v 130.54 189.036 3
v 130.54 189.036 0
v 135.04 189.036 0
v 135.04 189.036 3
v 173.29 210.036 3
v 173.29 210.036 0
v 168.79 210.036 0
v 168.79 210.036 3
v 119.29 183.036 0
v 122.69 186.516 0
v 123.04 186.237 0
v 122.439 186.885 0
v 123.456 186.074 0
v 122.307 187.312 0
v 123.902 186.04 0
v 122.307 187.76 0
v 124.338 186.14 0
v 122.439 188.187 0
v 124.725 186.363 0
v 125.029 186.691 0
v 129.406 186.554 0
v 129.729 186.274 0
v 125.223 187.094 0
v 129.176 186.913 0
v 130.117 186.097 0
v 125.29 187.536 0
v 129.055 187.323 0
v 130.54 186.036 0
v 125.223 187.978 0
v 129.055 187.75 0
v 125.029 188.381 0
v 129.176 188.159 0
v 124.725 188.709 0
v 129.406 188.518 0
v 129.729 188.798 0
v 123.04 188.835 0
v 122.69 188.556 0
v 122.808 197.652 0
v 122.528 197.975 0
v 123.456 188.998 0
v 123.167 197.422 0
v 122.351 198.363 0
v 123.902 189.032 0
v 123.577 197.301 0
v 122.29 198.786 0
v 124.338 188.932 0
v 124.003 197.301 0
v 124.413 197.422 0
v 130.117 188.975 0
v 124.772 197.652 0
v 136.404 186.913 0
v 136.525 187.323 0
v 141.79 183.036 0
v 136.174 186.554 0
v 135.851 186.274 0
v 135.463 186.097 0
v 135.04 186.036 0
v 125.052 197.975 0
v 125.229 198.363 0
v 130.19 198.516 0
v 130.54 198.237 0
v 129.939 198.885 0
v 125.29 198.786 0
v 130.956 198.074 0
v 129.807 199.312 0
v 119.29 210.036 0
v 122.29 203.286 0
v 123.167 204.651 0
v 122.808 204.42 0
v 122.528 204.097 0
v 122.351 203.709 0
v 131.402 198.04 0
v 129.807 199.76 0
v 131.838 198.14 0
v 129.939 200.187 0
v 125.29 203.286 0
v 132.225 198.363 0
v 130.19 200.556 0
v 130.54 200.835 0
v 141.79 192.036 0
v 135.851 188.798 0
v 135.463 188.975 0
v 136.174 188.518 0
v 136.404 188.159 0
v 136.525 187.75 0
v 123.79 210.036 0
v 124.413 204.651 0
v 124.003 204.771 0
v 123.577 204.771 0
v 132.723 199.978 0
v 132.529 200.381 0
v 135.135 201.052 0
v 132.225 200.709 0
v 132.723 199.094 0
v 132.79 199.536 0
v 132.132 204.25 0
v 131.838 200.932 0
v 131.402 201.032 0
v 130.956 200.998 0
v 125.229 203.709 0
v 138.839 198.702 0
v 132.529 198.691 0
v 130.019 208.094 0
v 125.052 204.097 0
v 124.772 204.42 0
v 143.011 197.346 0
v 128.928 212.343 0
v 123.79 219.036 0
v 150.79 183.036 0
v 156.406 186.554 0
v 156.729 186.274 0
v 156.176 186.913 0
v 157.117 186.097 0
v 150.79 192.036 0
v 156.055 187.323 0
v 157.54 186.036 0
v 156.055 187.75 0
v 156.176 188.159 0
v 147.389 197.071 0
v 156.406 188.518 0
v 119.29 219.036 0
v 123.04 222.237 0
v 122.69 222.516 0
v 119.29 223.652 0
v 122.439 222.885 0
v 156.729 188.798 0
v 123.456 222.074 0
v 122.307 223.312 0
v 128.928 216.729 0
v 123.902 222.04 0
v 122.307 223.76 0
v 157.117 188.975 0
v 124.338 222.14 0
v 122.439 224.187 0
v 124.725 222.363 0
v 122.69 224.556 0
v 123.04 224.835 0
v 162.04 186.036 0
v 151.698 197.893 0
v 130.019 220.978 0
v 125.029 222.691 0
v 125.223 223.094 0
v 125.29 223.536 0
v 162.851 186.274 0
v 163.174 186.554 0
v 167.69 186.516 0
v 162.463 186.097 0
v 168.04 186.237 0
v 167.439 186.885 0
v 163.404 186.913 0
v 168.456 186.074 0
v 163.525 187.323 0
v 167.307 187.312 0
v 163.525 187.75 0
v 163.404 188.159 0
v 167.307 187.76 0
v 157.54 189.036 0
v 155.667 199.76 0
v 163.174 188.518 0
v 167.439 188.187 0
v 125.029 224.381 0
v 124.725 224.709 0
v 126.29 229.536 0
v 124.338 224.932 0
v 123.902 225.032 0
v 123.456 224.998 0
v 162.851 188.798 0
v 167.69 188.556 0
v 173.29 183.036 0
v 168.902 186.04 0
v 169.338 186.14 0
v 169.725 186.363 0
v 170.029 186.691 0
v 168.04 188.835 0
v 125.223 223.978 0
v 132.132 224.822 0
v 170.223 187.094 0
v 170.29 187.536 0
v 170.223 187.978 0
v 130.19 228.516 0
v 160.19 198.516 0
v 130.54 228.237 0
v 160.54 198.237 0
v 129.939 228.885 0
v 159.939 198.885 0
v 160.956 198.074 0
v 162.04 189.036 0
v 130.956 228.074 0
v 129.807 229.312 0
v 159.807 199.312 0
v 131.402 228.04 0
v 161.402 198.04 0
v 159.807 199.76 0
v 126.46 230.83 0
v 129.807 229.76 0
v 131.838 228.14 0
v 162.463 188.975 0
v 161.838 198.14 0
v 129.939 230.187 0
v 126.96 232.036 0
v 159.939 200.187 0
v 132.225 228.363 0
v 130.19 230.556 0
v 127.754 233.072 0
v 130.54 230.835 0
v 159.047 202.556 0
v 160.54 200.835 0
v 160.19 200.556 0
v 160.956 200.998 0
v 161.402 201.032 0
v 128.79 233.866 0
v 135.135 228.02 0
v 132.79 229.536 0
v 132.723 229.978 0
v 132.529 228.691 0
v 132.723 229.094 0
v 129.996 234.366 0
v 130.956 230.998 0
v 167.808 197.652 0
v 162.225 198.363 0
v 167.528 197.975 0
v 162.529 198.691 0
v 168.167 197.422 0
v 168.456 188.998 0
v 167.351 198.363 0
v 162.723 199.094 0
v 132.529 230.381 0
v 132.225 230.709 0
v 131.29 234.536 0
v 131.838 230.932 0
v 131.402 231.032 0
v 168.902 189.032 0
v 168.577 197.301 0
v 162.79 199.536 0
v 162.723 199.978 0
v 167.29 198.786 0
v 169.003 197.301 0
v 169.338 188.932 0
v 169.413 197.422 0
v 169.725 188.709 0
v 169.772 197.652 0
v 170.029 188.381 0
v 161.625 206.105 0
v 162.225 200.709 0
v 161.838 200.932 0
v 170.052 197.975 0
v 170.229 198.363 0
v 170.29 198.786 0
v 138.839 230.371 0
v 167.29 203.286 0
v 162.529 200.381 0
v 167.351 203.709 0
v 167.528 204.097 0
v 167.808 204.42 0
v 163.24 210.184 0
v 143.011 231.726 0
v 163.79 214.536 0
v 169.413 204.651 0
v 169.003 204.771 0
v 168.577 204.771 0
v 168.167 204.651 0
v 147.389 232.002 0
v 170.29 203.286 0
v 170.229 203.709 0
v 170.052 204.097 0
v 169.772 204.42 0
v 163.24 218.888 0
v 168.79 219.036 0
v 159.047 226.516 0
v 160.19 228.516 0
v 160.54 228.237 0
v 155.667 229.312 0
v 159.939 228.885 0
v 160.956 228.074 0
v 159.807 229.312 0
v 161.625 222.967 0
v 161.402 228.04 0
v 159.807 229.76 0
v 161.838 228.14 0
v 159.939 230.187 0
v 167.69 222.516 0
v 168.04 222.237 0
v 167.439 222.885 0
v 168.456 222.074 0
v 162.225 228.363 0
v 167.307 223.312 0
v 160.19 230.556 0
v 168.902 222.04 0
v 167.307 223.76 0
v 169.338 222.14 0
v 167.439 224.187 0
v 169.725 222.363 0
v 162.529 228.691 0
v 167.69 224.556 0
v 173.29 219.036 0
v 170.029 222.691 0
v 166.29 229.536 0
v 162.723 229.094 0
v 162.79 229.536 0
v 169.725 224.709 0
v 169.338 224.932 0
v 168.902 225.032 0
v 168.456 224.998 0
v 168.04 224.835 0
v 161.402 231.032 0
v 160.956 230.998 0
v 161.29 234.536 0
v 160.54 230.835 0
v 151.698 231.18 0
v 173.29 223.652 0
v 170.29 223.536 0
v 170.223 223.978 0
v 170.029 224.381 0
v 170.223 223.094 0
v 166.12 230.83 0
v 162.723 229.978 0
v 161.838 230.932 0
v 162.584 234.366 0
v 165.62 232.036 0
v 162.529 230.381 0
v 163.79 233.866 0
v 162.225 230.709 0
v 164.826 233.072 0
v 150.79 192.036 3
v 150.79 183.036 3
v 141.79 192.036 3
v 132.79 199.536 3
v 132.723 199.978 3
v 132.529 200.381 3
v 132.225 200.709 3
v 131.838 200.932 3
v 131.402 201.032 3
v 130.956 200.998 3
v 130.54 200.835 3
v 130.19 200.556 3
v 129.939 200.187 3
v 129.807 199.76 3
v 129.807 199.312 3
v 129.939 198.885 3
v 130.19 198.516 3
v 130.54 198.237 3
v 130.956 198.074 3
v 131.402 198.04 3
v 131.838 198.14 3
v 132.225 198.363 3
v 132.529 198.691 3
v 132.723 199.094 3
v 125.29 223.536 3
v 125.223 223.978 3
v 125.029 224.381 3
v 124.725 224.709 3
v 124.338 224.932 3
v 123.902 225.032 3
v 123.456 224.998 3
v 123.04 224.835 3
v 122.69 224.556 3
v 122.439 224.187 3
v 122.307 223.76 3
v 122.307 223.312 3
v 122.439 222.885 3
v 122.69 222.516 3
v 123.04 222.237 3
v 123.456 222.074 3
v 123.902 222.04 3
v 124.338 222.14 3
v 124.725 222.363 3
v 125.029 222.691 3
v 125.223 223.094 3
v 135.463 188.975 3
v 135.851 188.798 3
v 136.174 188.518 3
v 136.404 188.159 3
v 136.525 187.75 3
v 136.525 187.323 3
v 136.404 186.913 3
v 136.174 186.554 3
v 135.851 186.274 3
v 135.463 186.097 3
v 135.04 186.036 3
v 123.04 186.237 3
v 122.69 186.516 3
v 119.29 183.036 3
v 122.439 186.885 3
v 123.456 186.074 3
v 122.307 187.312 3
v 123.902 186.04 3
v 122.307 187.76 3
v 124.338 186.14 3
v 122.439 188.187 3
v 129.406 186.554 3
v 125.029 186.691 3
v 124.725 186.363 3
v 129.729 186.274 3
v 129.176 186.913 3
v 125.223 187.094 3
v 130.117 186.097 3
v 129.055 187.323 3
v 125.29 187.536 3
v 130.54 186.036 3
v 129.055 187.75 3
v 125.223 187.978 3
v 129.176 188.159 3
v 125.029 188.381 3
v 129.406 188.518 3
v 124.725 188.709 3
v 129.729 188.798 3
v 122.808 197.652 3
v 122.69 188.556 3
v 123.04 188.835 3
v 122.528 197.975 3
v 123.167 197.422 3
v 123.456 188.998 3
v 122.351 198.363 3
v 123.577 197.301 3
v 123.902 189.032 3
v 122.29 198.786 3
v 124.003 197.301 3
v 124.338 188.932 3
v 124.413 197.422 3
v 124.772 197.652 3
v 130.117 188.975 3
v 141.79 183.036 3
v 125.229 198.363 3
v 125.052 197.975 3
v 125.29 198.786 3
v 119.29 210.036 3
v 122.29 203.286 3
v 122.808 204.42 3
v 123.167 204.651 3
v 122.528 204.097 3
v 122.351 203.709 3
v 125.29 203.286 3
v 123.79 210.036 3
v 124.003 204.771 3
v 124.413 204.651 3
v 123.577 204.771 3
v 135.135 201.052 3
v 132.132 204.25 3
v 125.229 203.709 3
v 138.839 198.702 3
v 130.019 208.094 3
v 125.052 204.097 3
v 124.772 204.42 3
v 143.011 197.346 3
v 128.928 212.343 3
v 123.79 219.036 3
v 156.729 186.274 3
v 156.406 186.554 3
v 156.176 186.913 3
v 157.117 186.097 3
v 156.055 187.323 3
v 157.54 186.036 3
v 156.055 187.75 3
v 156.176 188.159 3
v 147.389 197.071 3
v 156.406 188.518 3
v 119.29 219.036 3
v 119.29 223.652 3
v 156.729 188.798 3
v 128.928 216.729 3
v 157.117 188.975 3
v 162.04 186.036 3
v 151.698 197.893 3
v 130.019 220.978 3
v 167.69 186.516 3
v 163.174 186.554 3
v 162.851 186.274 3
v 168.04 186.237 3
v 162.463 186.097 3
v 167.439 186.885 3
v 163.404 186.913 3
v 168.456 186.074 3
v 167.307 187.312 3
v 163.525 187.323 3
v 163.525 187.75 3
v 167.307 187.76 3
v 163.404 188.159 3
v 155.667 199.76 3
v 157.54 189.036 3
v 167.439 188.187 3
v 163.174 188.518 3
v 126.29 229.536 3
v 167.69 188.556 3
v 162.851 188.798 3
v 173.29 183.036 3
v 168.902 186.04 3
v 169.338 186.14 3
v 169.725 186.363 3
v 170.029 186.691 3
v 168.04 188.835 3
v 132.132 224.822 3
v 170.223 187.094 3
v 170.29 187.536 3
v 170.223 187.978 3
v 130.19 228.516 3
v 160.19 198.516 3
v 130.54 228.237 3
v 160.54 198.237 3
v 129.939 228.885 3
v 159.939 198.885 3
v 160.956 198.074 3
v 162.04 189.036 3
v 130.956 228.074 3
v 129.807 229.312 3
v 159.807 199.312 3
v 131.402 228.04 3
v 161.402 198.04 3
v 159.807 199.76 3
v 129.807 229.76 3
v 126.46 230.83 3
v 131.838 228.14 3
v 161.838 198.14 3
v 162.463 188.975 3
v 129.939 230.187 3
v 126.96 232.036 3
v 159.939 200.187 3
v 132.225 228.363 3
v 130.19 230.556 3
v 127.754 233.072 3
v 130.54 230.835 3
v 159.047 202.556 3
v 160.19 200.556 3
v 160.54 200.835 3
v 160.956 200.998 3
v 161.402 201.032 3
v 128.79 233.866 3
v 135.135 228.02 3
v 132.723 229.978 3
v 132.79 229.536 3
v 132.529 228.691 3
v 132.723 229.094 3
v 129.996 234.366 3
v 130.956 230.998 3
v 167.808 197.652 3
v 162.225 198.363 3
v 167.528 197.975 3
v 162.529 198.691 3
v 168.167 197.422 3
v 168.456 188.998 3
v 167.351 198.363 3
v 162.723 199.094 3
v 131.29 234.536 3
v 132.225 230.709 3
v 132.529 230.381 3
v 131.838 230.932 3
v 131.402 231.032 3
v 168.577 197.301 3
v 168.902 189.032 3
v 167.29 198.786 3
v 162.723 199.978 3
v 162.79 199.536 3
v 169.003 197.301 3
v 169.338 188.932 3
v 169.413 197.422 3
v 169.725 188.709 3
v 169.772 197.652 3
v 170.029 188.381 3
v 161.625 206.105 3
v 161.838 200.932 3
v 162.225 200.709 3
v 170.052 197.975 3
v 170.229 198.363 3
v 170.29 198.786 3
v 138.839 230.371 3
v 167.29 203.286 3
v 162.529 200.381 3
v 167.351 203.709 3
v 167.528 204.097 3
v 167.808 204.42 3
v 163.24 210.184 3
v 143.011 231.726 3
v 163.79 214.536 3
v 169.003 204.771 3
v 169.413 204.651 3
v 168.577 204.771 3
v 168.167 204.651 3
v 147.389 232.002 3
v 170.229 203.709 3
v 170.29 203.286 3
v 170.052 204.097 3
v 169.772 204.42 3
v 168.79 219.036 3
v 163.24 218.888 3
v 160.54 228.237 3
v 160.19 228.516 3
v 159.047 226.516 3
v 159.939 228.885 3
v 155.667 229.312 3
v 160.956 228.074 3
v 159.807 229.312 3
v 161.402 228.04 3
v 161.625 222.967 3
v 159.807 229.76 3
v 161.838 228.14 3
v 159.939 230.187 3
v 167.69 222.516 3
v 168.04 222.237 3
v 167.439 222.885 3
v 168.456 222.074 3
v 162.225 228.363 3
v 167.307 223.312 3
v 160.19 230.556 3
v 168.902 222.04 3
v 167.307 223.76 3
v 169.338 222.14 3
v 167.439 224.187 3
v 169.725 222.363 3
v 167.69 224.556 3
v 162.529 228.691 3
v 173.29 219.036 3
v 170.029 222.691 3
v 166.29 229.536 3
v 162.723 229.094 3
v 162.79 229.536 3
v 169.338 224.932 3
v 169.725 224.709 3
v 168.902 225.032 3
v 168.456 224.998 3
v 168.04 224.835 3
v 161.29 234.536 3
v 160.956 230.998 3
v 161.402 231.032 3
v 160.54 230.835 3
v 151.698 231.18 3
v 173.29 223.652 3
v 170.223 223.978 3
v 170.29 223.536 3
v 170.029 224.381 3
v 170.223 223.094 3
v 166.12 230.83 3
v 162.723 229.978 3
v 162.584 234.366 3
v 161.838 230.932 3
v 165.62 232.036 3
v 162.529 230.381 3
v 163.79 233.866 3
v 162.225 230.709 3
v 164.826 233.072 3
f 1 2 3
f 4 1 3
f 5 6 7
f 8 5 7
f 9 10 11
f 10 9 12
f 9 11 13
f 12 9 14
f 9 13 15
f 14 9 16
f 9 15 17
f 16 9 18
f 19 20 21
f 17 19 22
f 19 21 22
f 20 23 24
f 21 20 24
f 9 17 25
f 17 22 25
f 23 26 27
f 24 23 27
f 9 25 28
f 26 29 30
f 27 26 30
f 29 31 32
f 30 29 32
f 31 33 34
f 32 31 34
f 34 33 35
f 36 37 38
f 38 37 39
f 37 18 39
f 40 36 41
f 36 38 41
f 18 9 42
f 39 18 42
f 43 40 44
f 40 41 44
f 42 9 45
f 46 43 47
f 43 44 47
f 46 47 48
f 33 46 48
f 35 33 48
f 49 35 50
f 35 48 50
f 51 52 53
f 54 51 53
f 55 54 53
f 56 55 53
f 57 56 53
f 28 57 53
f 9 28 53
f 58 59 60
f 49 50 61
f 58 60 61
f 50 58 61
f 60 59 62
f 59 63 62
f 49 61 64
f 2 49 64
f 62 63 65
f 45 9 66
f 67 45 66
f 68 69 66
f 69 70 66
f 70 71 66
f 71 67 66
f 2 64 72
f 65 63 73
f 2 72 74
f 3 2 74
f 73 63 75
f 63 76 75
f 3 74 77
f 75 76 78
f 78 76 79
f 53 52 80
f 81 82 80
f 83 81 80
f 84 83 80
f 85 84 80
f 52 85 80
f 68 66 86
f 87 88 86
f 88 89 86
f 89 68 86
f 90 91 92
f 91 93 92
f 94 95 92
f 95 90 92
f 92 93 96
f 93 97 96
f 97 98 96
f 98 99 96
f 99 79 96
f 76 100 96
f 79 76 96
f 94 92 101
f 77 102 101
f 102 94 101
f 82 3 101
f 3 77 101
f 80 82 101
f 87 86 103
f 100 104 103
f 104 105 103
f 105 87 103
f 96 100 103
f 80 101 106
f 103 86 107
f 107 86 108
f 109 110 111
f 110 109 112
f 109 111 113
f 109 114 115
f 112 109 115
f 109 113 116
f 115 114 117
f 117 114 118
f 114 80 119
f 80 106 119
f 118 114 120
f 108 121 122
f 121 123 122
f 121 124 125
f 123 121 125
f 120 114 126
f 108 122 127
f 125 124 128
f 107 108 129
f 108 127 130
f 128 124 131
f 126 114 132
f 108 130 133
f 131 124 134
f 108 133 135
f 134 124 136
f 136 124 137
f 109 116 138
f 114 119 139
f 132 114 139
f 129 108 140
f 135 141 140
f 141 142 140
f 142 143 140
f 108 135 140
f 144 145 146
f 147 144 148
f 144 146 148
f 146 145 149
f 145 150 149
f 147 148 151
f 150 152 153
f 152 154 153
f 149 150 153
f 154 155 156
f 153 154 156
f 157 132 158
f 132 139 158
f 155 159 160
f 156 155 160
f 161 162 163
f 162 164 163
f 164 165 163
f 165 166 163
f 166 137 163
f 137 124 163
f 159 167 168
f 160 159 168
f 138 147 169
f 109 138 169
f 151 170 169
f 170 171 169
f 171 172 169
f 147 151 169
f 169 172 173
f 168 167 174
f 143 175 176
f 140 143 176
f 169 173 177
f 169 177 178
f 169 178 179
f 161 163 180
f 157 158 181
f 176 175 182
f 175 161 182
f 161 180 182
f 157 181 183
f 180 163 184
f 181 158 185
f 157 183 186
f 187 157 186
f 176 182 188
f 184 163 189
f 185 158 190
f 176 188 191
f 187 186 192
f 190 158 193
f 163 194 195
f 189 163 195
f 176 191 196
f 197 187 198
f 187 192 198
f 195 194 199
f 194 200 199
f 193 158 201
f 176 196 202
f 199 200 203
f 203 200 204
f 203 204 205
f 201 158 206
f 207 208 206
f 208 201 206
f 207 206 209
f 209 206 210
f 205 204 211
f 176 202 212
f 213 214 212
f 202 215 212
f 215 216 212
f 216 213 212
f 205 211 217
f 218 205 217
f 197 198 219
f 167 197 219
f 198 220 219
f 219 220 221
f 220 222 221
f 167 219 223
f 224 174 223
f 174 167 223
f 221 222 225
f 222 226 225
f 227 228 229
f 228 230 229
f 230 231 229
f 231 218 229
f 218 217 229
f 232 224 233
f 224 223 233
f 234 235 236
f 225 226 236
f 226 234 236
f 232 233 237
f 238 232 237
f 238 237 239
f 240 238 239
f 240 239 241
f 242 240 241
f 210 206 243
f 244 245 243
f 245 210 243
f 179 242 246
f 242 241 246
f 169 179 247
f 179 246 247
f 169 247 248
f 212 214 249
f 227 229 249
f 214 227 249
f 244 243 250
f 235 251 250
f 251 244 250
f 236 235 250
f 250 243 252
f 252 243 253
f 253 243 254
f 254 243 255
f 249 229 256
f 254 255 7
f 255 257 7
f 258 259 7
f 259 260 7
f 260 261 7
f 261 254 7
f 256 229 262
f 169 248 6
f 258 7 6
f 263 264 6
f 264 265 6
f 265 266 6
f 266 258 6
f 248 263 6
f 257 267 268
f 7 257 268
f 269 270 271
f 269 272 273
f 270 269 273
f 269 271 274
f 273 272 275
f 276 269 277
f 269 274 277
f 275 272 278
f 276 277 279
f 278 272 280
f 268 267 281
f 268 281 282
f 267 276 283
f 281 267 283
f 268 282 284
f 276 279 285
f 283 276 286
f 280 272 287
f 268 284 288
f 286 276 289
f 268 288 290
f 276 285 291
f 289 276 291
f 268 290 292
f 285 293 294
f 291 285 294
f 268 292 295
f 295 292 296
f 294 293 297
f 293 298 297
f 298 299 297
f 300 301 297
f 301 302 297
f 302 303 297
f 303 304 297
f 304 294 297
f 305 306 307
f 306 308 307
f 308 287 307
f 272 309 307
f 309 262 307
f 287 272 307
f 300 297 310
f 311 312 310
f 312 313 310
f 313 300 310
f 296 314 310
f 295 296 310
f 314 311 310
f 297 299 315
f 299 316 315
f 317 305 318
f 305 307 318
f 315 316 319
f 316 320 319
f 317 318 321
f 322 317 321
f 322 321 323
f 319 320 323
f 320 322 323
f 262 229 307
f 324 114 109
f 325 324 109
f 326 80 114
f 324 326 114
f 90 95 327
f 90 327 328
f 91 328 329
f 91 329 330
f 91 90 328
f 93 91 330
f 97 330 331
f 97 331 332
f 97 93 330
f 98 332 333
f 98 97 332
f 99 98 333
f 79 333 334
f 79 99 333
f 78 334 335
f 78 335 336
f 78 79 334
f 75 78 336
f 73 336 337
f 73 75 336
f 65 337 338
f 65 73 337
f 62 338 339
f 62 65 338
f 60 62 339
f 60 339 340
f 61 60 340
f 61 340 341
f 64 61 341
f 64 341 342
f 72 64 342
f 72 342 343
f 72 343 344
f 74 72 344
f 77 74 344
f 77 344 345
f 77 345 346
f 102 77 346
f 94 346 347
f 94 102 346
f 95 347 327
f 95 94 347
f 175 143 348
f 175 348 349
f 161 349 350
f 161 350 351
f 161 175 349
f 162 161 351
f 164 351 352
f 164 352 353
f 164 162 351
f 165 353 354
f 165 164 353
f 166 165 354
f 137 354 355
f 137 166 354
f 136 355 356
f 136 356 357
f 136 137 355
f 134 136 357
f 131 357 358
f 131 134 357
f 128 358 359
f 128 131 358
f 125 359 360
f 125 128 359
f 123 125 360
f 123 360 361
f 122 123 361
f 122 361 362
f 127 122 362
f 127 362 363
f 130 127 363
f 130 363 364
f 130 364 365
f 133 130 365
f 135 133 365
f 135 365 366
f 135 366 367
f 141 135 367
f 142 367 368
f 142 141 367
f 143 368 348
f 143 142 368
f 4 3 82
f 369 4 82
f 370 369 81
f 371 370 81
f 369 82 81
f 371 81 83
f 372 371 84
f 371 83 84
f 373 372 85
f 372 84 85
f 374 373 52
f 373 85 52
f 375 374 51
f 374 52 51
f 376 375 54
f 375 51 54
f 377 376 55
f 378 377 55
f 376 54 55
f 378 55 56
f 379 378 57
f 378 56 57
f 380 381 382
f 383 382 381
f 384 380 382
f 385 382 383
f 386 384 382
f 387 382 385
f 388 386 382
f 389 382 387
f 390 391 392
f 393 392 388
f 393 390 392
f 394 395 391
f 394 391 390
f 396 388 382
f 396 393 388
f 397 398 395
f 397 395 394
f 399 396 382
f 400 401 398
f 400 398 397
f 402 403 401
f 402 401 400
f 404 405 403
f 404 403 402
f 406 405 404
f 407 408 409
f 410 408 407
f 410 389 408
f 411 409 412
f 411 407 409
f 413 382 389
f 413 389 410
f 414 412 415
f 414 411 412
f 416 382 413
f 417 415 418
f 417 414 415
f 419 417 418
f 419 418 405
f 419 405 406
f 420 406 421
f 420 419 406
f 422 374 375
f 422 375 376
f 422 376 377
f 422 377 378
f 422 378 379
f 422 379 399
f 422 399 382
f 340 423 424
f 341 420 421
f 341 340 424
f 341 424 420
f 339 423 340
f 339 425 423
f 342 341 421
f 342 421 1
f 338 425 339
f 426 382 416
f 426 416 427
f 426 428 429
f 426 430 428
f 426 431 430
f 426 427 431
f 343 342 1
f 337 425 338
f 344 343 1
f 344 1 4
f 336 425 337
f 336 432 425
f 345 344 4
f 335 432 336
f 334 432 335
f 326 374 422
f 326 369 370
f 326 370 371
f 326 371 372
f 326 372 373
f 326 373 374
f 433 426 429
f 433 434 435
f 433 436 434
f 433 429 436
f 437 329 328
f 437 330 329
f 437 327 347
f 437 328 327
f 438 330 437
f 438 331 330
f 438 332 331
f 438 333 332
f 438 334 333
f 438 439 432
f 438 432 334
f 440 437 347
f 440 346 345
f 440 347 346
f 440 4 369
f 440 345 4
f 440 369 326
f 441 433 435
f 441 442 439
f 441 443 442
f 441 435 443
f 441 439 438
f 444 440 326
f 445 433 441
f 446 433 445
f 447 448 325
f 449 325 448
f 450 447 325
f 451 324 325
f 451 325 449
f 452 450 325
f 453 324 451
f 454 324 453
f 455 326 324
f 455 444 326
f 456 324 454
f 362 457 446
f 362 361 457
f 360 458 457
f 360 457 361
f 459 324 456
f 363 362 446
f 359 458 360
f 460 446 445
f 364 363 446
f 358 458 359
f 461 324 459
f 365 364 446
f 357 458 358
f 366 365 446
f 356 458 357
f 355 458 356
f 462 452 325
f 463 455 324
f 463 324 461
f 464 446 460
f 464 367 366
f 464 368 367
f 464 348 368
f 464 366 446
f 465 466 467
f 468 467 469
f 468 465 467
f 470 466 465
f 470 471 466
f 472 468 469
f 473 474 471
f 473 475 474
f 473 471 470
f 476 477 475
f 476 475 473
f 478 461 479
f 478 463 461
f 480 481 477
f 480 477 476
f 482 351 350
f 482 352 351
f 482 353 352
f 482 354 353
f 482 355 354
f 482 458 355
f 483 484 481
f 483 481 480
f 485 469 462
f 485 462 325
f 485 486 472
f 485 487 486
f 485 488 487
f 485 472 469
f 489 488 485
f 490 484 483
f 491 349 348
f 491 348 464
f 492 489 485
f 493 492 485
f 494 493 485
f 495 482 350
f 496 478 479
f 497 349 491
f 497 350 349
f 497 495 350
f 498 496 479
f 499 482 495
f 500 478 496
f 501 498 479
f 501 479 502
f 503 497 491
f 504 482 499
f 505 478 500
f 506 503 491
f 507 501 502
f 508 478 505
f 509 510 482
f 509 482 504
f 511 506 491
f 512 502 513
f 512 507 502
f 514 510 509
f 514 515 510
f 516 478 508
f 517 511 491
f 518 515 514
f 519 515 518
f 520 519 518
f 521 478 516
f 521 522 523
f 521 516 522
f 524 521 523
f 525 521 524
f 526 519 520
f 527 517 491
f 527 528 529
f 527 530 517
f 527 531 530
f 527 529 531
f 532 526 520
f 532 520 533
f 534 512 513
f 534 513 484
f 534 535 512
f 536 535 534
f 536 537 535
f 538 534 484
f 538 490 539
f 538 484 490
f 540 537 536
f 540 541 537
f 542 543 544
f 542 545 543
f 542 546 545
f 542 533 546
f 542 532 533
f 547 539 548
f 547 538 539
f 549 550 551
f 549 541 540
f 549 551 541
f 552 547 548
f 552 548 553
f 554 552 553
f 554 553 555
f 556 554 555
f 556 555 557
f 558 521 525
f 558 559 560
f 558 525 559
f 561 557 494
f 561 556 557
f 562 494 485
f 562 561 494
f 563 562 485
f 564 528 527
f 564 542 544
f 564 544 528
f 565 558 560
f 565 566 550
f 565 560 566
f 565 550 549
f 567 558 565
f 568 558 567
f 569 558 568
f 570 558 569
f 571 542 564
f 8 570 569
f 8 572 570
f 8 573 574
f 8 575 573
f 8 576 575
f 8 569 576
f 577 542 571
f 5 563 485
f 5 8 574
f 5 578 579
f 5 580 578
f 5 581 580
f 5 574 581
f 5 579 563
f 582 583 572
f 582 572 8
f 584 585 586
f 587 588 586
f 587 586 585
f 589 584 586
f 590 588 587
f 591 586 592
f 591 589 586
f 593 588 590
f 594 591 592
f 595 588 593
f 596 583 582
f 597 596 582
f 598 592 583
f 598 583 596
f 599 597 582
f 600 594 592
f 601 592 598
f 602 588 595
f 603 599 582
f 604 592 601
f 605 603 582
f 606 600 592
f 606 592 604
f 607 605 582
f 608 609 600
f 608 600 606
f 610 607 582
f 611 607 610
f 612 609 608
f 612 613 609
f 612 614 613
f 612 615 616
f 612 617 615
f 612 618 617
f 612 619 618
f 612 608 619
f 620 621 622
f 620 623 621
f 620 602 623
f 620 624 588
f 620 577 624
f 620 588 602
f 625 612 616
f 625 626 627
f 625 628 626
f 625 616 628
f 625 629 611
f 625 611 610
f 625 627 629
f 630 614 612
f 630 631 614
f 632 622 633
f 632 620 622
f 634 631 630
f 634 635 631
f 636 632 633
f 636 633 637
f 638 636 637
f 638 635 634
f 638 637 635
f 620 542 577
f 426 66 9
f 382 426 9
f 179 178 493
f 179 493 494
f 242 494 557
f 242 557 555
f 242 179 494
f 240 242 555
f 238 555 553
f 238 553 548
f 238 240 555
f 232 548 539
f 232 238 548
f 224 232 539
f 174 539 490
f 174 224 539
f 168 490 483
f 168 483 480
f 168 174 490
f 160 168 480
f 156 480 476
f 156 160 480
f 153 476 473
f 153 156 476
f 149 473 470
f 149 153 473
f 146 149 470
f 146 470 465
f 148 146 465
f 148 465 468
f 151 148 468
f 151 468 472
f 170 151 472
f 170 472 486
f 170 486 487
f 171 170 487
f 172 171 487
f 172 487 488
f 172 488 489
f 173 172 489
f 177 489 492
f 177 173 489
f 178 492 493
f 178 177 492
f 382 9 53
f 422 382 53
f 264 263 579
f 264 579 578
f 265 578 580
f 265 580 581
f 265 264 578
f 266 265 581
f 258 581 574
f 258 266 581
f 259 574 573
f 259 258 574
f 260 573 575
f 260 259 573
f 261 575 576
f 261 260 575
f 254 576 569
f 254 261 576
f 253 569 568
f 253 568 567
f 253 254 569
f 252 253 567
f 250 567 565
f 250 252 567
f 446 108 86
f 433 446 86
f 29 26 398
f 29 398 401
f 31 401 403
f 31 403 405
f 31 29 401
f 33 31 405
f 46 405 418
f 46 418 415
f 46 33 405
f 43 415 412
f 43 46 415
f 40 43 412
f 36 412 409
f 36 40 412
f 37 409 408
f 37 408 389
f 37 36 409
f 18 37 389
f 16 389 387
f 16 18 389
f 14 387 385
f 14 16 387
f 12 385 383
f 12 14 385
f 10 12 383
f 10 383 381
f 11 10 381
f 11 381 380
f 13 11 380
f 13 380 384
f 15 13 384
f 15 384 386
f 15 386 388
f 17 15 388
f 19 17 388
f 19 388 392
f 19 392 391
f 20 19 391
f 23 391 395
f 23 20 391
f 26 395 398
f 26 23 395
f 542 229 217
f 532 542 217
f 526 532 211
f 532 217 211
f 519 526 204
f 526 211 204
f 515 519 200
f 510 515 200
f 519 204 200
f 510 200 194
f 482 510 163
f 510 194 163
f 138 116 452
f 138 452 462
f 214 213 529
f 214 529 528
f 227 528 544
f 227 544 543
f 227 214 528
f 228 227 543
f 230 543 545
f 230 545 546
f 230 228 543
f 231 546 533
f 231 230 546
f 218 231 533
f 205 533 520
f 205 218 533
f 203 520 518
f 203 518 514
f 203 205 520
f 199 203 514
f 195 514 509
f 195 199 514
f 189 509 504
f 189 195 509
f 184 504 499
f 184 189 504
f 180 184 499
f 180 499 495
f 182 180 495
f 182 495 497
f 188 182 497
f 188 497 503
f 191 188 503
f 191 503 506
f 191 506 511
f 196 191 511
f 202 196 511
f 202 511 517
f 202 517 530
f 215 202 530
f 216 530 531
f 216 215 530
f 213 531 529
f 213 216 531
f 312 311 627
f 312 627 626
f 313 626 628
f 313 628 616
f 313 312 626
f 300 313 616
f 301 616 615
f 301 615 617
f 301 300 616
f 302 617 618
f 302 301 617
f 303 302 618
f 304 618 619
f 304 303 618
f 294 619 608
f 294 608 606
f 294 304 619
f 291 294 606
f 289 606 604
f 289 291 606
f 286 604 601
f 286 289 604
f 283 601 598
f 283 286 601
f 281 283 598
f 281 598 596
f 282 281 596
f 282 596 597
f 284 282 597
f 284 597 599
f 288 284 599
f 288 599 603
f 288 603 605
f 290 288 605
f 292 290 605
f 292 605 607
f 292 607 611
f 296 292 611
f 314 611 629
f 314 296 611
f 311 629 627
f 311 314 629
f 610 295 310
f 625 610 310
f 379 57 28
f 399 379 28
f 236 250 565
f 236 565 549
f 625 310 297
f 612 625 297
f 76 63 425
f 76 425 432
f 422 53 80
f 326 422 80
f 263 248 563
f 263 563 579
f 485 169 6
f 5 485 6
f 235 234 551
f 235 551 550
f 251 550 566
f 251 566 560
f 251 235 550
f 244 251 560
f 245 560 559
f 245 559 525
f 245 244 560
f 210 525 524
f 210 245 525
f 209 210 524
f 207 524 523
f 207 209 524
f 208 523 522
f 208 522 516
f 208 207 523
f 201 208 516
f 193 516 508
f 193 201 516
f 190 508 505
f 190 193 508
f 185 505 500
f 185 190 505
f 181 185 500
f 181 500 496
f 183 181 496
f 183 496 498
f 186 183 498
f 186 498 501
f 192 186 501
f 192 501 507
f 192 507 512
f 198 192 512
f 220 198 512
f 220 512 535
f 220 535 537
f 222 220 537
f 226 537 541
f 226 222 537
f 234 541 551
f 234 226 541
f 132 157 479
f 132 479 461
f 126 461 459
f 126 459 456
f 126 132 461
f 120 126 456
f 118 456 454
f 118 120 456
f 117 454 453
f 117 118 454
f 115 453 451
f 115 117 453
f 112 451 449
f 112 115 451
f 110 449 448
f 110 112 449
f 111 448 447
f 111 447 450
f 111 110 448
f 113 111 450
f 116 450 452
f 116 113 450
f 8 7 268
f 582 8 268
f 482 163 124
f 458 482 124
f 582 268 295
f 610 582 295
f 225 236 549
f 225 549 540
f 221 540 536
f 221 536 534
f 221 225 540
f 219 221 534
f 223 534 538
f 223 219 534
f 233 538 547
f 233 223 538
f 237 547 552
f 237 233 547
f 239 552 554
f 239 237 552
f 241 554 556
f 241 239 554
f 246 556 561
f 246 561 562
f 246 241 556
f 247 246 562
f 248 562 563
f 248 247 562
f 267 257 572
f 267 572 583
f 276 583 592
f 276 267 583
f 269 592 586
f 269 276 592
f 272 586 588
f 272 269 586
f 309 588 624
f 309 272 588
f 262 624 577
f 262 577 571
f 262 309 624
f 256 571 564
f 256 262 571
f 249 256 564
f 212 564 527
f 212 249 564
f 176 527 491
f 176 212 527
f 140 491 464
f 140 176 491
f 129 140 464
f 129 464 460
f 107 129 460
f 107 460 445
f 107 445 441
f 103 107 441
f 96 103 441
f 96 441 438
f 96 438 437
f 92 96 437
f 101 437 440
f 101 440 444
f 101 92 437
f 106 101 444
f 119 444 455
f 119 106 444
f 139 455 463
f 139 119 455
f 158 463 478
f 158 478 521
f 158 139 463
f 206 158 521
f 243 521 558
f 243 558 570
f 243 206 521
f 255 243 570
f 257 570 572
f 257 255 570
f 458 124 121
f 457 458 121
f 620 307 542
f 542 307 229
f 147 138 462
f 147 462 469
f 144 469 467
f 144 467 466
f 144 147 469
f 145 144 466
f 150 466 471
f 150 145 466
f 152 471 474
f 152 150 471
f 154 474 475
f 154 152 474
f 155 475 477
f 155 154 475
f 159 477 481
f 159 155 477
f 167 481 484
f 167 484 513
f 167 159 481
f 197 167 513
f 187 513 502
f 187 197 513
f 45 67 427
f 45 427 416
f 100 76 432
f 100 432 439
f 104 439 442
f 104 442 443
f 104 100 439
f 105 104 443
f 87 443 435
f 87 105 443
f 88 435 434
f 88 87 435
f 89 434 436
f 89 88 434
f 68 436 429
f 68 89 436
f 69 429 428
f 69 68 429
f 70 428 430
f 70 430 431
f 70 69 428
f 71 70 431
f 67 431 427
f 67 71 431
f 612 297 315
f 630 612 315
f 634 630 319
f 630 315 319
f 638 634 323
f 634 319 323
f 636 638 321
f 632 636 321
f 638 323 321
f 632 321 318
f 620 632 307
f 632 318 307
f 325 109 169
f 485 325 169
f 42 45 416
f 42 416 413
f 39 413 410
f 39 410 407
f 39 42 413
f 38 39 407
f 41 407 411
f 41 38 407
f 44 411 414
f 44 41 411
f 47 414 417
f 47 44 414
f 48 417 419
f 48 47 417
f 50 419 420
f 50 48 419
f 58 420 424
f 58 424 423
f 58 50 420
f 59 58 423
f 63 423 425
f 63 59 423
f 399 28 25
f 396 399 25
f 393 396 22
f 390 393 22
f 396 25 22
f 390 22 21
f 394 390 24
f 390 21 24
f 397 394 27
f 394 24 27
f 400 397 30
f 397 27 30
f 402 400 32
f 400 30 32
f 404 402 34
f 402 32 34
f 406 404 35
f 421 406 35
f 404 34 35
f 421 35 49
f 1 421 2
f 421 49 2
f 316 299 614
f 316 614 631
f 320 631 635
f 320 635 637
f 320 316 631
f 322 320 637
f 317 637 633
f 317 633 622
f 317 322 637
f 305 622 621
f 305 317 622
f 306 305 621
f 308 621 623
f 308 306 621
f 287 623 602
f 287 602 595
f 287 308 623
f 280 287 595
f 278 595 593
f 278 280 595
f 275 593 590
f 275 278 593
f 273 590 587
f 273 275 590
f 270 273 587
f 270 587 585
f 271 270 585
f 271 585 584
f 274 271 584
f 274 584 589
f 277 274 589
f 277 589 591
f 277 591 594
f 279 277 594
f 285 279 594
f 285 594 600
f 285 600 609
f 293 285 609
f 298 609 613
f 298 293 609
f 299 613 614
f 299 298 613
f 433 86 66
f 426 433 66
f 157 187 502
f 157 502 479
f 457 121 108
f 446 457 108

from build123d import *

# Parameters (mm, degrees)
MODEL_R                 = 17.5
MODEL_R_2               = 1.5
SALIENTE_EXTRUIR1_DEPTH = 3


with BuildPart() as part:
    # Model → Saliente-Extruir1 (new body)
    with BuildSketch(Plane.XY):
        with BuildLine():
            Line((119.290027295, 223.651688958), (119.290027295, 219.036053988))
            Line((119.290027295, 219.036053988), (123.790027295, 219.036053988))
            Line((123.790027295, 219.036053988), (123.790027295, 210.036053988))
            Line((123.790027295, 210.036053988), (119.290027295, 210.036053988))
            Line((119.290027295, 210.036053988), (119.290027295, 183.036053988))
            Line((119.290027295, 183.036053988), (141.790027295, 183.036053988))
            Line((141.790027295, 183.036053988), (141.790027295, 192.036053988))
            Line((141.790027295, 192.036053988), (150.790027295, 192.036053988))
            Line((150.790027295, 192.036053988), (150.790027295, 183.036053988))
            Line((150.790027295, 183.036053988), (173.290027295, 183.036053988))
            Line((173.290027295, 183.036053988), (173.290027295, 210.036053988))
            Line((173.290027295, 210.036053988), (168.790027295, 210.036053988))
            Line((168.790027295, 210.036053988), (168.790027295, 219.036053988))
            Line((168.790027295, 219.036053988), (173.290027295, 219.036053988))
            Line((173.290027295, 219.036053988), (173.290027295, 223.651688958))
            Line((173.290027295, 223.651688958), (166.290027295, 229.536053988))
            ThreePointArc((166.290027295, 229.536053988), (164.825561201, 233.071587894), (161.290027295, 234.536053988))
            Line((161.290027295, 234.536053988), (131.290027295, 234.536053988))
            ThreePointArc((131.290027295, 234.536053988), (127.754493389, 233.071587894), (126.290027295, 229.536053988))
            Line((126.290027295, 229.536053988), (119.290027295, 223.651688958))
        make_face()
        with Locations((146.290027295, 214.536053988)):
            Circle(MODEL_R, mode=Mode.SUBTRACT)
        with Locations((168.790027295, 223.536053988)):
            Circle(MODEL_R_2, mode=Mode.SUBTRACT)
        with Locations((161.290027295, 229.536053988)):
            Circle(MODEL_R_2, mode=Mode.SUBTRACT)
        with Locations((168.790027295, 187.536053988)):
            Circle(MODEL_R_2, mode=Mode.SUBTRACT)
        with Locations((161.290027295, 199.536053988)):
            Circle(MODEL_R_2, mode=Mode.SUBTRACT)
        with Locations((123.790027295, 223.536053988)):
            Circle(MODEL_R_2, mode=Mode.SUBTRACT)
        with Locations((131.290027295, 229.536053988)):
            Circle(MODEL_R_2, mode=Mode.SUBTRACT)
        with Locations((131.290027295, 199.536053988)):
            Circle(MODEL_R_2, mode=Mode.SUBTRACT)
        with Locations((123.790027295, 187.536053988)):
            Circle(MODEL_R_2, mode=Mode.SUBTRACT)
        with BuildLine():
            Line((122.290027295, 203.286053988), (122.290027295, 198.786053988))
            ThreePointArc((122.290027295, 198.786053988), (123.790027295, 197.286053988), (125.290027295, 198.786053988))
            Line((125.290027295, 198.786053988), (125.290027295, 203.286053988))
            ThreePointArc((125.290027295, 203.286053988), (123.790027295, 204.786053988), (122.290027295, 203.286053988))
        make_face(mode=Mode.SUBTRACT)
        with BuildLine():
            Line((167.290027295, 203.286053988), (167.290027295, 198.786053988))
            ThreePointArc((167.290027295, 198.786053988), (168.790027295, 197.286053988), (170.290027295, 198.786053988))
            Line((170.290027295, 198.786053988), (170.290027295, 203.286053988))
            ThreePointArc((170.290027295, 203.286053988), (168.790027295, 204.786053988), (167.290027295, 203.286053988))
        make_face(mode=Mode.SUBTRACT)
        with BuildLine():
            Line((162.040027295, 189.036053988), (157.540027295, 189.036053988))
            ThreePointArc((157.540027295, 189.036053988), (156.040027295, 187.536053988), (157.540027295, 186.036053988))
            Line((157.540027295, 186.036053988), (162.040027295, 186.036053988))
            ThreePointArc((162.040027295, 186.036053988), (163.540027295, 187.536053988), (162.040027295, 189.036053988))
        make_face(mode=Mode.SUBTRACT)
        with BuildLine():
            Line((135.040027295, 186.036053988), (130.540027295, 186.036053988))
            ThreePointArc((130.540027295, 186.036053988), (129.040027295, 187.536053988), (130.540027295, 189.036053988))
            Line((130.540027295, 189.036053988), (135.040027295, 189.036053988))
            ThreePointArc((135.040027295, 189.036053988), (136.540027295, 187.536053988), (135.040027295, 186.036053988))
        make_face(mode=Mode.SUBTRACT)
    extrude(amount=SALIENTE_EXTRUIR1_DEPTH)


solid = part.part
